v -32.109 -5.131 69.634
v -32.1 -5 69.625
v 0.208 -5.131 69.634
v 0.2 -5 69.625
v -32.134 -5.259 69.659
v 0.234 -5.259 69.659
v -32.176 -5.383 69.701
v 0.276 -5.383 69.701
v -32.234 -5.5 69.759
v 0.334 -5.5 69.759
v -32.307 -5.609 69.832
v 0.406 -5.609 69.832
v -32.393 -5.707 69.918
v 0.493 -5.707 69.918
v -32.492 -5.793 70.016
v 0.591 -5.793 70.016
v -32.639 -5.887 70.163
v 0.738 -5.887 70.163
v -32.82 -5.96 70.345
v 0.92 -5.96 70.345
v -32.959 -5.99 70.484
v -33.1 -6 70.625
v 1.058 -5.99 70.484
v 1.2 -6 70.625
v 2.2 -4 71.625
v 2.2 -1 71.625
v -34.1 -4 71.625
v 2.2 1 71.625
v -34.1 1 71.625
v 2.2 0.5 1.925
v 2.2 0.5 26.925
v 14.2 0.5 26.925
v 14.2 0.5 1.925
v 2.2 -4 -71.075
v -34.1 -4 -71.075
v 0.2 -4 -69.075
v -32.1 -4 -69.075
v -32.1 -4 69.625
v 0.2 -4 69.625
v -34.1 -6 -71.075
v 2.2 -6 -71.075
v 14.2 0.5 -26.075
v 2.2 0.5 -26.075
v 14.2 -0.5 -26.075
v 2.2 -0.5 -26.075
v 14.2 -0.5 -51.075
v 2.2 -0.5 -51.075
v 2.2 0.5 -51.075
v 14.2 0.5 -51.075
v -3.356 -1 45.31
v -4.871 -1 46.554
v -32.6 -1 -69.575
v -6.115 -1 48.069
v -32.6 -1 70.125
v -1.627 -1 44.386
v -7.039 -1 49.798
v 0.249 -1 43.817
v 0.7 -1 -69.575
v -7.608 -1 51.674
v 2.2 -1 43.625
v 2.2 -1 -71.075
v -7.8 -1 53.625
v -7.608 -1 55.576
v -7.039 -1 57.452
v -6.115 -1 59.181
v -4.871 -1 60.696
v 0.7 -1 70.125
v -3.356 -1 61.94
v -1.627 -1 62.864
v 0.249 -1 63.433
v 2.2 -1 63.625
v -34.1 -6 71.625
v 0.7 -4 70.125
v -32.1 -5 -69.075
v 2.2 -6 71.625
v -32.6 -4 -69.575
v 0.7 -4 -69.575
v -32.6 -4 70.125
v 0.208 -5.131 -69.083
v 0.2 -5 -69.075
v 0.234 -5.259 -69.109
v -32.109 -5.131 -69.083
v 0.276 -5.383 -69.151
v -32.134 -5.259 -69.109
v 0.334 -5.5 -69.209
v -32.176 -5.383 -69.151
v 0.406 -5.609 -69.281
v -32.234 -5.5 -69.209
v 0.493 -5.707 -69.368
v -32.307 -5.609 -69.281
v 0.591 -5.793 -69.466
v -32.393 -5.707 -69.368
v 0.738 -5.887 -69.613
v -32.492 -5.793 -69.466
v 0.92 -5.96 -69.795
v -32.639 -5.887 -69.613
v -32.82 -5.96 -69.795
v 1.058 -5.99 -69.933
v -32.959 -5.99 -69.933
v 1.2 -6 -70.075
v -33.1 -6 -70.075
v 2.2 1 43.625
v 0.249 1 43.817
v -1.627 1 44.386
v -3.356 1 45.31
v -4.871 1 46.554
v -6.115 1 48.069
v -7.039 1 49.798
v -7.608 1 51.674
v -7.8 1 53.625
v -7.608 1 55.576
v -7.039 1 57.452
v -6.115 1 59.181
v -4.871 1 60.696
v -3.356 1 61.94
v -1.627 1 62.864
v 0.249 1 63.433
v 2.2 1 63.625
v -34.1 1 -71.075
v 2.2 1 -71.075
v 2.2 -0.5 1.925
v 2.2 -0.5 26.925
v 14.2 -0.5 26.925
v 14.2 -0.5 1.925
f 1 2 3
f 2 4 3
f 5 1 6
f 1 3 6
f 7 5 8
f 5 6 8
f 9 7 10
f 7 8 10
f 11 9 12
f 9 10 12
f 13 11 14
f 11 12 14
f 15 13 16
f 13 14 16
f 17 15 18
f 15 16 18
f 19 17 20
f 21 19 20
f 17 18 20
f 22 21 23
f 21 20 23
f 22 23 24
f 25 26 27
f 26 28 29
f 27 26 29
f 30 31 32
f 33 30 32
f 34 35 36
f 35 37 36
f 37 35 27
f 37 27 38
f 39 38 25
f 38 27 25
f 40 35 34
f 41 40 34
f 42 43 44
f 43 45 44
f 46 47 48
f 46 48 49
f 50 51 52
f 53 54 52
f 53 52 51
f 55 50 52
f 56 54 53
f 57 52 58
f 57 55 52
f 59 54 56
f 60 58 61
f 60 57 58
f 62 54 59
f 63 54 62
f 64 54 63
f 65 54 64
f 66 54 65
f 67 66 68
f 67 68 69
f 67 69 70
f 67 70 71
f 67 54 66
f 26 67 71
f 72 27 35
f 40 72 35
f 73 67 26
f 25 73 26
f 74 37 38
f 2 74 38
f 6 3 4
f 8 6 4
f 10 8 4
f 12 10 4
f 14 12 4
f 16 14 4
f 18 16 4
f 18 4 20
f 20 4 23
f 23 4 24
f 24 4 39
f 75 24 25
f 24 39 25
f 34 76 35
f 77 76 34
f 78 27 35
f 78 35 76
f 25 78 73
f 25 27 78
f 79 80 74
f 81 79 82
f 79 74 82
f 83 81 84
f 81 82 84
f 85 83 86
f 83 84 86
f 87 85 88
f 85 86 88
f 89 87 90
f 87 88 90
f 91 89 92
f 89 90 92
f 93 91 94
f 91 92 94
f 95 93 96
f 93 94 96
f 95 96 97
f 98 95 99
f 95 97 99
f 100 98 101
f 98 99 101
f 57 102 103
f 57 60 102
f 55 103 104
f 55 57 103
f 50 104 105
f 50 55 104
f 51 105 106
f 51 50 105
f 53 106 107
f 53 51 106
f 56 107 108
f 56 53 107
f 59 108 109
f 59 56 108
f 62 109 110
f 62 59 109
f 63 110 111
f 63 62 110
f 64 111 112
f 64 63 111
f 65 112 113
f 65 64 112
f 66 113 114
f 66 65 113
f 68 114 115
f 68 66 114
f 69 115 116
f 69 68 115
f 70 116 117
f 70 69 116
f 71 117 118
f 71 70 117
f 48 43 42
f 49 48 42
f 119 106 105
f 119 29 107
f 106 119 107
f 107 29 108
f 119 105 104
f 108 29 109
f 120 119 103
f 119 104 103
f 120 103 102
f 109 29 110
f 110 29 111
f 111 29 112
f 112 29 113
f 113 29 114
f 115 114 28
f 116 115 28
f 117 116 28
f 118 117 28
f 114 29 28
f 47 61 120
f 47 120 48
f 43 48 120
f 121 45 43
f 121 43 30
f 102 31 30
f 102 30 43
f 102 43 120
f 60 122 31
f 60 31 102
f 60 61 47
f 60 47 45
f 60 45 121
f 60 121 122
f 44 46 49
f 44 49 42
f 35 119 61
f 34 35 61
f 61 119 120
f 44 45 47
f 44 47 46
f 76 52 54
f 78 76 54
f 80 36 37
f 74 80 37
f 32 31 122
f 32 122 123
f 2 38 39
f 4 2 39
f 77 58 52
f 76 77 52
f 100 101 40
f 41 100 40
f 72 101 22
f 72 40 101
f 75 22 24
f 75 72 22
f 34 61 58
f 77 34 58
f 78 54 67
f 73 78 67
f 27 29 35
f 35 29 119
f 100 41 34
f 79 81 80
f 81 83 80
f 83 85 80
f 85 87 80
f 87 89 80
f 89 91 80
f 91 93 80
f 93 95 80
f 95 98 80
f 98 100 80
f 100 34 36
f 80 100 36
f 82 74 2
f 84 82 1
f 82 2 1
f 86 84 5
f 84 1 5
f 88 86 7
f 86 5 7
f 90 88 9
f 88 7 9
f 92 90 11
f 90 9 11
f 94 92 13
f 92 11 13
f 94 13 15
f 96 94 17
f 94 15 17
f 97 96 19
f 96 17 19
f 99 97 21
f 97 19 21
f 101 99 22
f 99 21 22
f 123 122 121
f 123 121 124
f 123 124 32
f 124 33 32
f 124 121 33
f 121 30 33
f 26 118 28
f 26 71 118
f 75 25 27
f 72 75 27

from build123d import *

# Parameters (mm, degrees)
F1_DEPTH = 1
F0_W     = 12
F0_H     = 25
F2_DEPTH = 0.5
F4_DEPTH = 3
F6_DEPTH = 2
F7_R     = 1


with BuildPart() as f1:
    # F0 (on Front) → F1 (new body, symmetric)
    with BuildSketch(Plane.XZ):
        with BuildLine():
            Line((2.199701, 71.625195), (-34.100299, 71.625195))
            Line((-34.100299, 71.625195), (-34.100299, -71.074805))
            Line((-34.100299, -71.074805), (2.199701, -71.074805))
            Line((2.199701, -71.074805), (2.199701, -51.074805))
            Line((2.199701, -51.074805), (2.199701, -26.074805))
            Line((2.199701, -26.074805), (2.199701, 1.925195))
            Line((2.199701, 1.925195), (2.199701, 26.925195))
            Line((2.199701, 26.925195), (2.199701, 43.625195))
            ThreePointArc((2.199701, 43.625195), (-7.800299, 53.625195), (2.199701, 63.625195))
            Line((2.199701, 63.625195), (2.199701, 71.625195))
        make_face()
    extrude(amount=F1_DEPTH, both=True)

    # F0 (on Front) → F2 (join, symmetric)
    with BuildSketch(Plane.XZ):
        with Locations((8.199701, 14.425195)):
            Rectangle(F0_W, F0_H)
        with Locations((8.199701, -38.574805)):
            Rectangle(F0_W, F0_H)
    extrude(amount=F2_DEPTH, both=True)

    # F3 (on face) → F4 (join)
    with BuildSketch(Plane.XZ.offset(1)):
        Polygon((-34.100299, -71.074805), (2.199701, -71.074805), (0.699701, -69.574805), (-32.600299, -69.574805), (-32.600299, 70.125195), (0.699701, 70.125195), (2.199701, 71.625195), (-34.100299, 71.625195), align=None)
    extrude(amount=F4_DEPTH)


with BuildPart() as f6:
    # F5 (on face) → F6 (new body)
    with BuildSketch(Plane.XZ.offset(4)):
        Polygon((-34.100299, -71.074805), (2.199701, -71.074805), (1.1997, -70.074804), (-33.100299, -70.074804), (-33.100299, 70.625195), (1.199701, 70.625195), (2.199701, 71.625195), (-34.100299, 71.625195), align=None)
        Polygon((-33.100299, -70.074804), (1.1997, -70.074804), (0.199699, -69.074803), (-32.100299, -69.074803), (-32.100299, 69.625195), (0.199701, 69.625195), (1.199701, 70.625195), (-33.100299, 70.625195), align=None)
    extrude(amount=F6_DEPTH)

    # F7
    f7_edges = [f6.edges().sort_by_distance(p)[0] for p in [
        (-32.100299, -6, 0.275196),
        (-15.950299, -6, 69.625195),
        (-15.9503, -6, -69.074803),
    ]]
    fillet(f7_edges, radius=F7_R)


solid = Compound([f1.part, f6.part])
